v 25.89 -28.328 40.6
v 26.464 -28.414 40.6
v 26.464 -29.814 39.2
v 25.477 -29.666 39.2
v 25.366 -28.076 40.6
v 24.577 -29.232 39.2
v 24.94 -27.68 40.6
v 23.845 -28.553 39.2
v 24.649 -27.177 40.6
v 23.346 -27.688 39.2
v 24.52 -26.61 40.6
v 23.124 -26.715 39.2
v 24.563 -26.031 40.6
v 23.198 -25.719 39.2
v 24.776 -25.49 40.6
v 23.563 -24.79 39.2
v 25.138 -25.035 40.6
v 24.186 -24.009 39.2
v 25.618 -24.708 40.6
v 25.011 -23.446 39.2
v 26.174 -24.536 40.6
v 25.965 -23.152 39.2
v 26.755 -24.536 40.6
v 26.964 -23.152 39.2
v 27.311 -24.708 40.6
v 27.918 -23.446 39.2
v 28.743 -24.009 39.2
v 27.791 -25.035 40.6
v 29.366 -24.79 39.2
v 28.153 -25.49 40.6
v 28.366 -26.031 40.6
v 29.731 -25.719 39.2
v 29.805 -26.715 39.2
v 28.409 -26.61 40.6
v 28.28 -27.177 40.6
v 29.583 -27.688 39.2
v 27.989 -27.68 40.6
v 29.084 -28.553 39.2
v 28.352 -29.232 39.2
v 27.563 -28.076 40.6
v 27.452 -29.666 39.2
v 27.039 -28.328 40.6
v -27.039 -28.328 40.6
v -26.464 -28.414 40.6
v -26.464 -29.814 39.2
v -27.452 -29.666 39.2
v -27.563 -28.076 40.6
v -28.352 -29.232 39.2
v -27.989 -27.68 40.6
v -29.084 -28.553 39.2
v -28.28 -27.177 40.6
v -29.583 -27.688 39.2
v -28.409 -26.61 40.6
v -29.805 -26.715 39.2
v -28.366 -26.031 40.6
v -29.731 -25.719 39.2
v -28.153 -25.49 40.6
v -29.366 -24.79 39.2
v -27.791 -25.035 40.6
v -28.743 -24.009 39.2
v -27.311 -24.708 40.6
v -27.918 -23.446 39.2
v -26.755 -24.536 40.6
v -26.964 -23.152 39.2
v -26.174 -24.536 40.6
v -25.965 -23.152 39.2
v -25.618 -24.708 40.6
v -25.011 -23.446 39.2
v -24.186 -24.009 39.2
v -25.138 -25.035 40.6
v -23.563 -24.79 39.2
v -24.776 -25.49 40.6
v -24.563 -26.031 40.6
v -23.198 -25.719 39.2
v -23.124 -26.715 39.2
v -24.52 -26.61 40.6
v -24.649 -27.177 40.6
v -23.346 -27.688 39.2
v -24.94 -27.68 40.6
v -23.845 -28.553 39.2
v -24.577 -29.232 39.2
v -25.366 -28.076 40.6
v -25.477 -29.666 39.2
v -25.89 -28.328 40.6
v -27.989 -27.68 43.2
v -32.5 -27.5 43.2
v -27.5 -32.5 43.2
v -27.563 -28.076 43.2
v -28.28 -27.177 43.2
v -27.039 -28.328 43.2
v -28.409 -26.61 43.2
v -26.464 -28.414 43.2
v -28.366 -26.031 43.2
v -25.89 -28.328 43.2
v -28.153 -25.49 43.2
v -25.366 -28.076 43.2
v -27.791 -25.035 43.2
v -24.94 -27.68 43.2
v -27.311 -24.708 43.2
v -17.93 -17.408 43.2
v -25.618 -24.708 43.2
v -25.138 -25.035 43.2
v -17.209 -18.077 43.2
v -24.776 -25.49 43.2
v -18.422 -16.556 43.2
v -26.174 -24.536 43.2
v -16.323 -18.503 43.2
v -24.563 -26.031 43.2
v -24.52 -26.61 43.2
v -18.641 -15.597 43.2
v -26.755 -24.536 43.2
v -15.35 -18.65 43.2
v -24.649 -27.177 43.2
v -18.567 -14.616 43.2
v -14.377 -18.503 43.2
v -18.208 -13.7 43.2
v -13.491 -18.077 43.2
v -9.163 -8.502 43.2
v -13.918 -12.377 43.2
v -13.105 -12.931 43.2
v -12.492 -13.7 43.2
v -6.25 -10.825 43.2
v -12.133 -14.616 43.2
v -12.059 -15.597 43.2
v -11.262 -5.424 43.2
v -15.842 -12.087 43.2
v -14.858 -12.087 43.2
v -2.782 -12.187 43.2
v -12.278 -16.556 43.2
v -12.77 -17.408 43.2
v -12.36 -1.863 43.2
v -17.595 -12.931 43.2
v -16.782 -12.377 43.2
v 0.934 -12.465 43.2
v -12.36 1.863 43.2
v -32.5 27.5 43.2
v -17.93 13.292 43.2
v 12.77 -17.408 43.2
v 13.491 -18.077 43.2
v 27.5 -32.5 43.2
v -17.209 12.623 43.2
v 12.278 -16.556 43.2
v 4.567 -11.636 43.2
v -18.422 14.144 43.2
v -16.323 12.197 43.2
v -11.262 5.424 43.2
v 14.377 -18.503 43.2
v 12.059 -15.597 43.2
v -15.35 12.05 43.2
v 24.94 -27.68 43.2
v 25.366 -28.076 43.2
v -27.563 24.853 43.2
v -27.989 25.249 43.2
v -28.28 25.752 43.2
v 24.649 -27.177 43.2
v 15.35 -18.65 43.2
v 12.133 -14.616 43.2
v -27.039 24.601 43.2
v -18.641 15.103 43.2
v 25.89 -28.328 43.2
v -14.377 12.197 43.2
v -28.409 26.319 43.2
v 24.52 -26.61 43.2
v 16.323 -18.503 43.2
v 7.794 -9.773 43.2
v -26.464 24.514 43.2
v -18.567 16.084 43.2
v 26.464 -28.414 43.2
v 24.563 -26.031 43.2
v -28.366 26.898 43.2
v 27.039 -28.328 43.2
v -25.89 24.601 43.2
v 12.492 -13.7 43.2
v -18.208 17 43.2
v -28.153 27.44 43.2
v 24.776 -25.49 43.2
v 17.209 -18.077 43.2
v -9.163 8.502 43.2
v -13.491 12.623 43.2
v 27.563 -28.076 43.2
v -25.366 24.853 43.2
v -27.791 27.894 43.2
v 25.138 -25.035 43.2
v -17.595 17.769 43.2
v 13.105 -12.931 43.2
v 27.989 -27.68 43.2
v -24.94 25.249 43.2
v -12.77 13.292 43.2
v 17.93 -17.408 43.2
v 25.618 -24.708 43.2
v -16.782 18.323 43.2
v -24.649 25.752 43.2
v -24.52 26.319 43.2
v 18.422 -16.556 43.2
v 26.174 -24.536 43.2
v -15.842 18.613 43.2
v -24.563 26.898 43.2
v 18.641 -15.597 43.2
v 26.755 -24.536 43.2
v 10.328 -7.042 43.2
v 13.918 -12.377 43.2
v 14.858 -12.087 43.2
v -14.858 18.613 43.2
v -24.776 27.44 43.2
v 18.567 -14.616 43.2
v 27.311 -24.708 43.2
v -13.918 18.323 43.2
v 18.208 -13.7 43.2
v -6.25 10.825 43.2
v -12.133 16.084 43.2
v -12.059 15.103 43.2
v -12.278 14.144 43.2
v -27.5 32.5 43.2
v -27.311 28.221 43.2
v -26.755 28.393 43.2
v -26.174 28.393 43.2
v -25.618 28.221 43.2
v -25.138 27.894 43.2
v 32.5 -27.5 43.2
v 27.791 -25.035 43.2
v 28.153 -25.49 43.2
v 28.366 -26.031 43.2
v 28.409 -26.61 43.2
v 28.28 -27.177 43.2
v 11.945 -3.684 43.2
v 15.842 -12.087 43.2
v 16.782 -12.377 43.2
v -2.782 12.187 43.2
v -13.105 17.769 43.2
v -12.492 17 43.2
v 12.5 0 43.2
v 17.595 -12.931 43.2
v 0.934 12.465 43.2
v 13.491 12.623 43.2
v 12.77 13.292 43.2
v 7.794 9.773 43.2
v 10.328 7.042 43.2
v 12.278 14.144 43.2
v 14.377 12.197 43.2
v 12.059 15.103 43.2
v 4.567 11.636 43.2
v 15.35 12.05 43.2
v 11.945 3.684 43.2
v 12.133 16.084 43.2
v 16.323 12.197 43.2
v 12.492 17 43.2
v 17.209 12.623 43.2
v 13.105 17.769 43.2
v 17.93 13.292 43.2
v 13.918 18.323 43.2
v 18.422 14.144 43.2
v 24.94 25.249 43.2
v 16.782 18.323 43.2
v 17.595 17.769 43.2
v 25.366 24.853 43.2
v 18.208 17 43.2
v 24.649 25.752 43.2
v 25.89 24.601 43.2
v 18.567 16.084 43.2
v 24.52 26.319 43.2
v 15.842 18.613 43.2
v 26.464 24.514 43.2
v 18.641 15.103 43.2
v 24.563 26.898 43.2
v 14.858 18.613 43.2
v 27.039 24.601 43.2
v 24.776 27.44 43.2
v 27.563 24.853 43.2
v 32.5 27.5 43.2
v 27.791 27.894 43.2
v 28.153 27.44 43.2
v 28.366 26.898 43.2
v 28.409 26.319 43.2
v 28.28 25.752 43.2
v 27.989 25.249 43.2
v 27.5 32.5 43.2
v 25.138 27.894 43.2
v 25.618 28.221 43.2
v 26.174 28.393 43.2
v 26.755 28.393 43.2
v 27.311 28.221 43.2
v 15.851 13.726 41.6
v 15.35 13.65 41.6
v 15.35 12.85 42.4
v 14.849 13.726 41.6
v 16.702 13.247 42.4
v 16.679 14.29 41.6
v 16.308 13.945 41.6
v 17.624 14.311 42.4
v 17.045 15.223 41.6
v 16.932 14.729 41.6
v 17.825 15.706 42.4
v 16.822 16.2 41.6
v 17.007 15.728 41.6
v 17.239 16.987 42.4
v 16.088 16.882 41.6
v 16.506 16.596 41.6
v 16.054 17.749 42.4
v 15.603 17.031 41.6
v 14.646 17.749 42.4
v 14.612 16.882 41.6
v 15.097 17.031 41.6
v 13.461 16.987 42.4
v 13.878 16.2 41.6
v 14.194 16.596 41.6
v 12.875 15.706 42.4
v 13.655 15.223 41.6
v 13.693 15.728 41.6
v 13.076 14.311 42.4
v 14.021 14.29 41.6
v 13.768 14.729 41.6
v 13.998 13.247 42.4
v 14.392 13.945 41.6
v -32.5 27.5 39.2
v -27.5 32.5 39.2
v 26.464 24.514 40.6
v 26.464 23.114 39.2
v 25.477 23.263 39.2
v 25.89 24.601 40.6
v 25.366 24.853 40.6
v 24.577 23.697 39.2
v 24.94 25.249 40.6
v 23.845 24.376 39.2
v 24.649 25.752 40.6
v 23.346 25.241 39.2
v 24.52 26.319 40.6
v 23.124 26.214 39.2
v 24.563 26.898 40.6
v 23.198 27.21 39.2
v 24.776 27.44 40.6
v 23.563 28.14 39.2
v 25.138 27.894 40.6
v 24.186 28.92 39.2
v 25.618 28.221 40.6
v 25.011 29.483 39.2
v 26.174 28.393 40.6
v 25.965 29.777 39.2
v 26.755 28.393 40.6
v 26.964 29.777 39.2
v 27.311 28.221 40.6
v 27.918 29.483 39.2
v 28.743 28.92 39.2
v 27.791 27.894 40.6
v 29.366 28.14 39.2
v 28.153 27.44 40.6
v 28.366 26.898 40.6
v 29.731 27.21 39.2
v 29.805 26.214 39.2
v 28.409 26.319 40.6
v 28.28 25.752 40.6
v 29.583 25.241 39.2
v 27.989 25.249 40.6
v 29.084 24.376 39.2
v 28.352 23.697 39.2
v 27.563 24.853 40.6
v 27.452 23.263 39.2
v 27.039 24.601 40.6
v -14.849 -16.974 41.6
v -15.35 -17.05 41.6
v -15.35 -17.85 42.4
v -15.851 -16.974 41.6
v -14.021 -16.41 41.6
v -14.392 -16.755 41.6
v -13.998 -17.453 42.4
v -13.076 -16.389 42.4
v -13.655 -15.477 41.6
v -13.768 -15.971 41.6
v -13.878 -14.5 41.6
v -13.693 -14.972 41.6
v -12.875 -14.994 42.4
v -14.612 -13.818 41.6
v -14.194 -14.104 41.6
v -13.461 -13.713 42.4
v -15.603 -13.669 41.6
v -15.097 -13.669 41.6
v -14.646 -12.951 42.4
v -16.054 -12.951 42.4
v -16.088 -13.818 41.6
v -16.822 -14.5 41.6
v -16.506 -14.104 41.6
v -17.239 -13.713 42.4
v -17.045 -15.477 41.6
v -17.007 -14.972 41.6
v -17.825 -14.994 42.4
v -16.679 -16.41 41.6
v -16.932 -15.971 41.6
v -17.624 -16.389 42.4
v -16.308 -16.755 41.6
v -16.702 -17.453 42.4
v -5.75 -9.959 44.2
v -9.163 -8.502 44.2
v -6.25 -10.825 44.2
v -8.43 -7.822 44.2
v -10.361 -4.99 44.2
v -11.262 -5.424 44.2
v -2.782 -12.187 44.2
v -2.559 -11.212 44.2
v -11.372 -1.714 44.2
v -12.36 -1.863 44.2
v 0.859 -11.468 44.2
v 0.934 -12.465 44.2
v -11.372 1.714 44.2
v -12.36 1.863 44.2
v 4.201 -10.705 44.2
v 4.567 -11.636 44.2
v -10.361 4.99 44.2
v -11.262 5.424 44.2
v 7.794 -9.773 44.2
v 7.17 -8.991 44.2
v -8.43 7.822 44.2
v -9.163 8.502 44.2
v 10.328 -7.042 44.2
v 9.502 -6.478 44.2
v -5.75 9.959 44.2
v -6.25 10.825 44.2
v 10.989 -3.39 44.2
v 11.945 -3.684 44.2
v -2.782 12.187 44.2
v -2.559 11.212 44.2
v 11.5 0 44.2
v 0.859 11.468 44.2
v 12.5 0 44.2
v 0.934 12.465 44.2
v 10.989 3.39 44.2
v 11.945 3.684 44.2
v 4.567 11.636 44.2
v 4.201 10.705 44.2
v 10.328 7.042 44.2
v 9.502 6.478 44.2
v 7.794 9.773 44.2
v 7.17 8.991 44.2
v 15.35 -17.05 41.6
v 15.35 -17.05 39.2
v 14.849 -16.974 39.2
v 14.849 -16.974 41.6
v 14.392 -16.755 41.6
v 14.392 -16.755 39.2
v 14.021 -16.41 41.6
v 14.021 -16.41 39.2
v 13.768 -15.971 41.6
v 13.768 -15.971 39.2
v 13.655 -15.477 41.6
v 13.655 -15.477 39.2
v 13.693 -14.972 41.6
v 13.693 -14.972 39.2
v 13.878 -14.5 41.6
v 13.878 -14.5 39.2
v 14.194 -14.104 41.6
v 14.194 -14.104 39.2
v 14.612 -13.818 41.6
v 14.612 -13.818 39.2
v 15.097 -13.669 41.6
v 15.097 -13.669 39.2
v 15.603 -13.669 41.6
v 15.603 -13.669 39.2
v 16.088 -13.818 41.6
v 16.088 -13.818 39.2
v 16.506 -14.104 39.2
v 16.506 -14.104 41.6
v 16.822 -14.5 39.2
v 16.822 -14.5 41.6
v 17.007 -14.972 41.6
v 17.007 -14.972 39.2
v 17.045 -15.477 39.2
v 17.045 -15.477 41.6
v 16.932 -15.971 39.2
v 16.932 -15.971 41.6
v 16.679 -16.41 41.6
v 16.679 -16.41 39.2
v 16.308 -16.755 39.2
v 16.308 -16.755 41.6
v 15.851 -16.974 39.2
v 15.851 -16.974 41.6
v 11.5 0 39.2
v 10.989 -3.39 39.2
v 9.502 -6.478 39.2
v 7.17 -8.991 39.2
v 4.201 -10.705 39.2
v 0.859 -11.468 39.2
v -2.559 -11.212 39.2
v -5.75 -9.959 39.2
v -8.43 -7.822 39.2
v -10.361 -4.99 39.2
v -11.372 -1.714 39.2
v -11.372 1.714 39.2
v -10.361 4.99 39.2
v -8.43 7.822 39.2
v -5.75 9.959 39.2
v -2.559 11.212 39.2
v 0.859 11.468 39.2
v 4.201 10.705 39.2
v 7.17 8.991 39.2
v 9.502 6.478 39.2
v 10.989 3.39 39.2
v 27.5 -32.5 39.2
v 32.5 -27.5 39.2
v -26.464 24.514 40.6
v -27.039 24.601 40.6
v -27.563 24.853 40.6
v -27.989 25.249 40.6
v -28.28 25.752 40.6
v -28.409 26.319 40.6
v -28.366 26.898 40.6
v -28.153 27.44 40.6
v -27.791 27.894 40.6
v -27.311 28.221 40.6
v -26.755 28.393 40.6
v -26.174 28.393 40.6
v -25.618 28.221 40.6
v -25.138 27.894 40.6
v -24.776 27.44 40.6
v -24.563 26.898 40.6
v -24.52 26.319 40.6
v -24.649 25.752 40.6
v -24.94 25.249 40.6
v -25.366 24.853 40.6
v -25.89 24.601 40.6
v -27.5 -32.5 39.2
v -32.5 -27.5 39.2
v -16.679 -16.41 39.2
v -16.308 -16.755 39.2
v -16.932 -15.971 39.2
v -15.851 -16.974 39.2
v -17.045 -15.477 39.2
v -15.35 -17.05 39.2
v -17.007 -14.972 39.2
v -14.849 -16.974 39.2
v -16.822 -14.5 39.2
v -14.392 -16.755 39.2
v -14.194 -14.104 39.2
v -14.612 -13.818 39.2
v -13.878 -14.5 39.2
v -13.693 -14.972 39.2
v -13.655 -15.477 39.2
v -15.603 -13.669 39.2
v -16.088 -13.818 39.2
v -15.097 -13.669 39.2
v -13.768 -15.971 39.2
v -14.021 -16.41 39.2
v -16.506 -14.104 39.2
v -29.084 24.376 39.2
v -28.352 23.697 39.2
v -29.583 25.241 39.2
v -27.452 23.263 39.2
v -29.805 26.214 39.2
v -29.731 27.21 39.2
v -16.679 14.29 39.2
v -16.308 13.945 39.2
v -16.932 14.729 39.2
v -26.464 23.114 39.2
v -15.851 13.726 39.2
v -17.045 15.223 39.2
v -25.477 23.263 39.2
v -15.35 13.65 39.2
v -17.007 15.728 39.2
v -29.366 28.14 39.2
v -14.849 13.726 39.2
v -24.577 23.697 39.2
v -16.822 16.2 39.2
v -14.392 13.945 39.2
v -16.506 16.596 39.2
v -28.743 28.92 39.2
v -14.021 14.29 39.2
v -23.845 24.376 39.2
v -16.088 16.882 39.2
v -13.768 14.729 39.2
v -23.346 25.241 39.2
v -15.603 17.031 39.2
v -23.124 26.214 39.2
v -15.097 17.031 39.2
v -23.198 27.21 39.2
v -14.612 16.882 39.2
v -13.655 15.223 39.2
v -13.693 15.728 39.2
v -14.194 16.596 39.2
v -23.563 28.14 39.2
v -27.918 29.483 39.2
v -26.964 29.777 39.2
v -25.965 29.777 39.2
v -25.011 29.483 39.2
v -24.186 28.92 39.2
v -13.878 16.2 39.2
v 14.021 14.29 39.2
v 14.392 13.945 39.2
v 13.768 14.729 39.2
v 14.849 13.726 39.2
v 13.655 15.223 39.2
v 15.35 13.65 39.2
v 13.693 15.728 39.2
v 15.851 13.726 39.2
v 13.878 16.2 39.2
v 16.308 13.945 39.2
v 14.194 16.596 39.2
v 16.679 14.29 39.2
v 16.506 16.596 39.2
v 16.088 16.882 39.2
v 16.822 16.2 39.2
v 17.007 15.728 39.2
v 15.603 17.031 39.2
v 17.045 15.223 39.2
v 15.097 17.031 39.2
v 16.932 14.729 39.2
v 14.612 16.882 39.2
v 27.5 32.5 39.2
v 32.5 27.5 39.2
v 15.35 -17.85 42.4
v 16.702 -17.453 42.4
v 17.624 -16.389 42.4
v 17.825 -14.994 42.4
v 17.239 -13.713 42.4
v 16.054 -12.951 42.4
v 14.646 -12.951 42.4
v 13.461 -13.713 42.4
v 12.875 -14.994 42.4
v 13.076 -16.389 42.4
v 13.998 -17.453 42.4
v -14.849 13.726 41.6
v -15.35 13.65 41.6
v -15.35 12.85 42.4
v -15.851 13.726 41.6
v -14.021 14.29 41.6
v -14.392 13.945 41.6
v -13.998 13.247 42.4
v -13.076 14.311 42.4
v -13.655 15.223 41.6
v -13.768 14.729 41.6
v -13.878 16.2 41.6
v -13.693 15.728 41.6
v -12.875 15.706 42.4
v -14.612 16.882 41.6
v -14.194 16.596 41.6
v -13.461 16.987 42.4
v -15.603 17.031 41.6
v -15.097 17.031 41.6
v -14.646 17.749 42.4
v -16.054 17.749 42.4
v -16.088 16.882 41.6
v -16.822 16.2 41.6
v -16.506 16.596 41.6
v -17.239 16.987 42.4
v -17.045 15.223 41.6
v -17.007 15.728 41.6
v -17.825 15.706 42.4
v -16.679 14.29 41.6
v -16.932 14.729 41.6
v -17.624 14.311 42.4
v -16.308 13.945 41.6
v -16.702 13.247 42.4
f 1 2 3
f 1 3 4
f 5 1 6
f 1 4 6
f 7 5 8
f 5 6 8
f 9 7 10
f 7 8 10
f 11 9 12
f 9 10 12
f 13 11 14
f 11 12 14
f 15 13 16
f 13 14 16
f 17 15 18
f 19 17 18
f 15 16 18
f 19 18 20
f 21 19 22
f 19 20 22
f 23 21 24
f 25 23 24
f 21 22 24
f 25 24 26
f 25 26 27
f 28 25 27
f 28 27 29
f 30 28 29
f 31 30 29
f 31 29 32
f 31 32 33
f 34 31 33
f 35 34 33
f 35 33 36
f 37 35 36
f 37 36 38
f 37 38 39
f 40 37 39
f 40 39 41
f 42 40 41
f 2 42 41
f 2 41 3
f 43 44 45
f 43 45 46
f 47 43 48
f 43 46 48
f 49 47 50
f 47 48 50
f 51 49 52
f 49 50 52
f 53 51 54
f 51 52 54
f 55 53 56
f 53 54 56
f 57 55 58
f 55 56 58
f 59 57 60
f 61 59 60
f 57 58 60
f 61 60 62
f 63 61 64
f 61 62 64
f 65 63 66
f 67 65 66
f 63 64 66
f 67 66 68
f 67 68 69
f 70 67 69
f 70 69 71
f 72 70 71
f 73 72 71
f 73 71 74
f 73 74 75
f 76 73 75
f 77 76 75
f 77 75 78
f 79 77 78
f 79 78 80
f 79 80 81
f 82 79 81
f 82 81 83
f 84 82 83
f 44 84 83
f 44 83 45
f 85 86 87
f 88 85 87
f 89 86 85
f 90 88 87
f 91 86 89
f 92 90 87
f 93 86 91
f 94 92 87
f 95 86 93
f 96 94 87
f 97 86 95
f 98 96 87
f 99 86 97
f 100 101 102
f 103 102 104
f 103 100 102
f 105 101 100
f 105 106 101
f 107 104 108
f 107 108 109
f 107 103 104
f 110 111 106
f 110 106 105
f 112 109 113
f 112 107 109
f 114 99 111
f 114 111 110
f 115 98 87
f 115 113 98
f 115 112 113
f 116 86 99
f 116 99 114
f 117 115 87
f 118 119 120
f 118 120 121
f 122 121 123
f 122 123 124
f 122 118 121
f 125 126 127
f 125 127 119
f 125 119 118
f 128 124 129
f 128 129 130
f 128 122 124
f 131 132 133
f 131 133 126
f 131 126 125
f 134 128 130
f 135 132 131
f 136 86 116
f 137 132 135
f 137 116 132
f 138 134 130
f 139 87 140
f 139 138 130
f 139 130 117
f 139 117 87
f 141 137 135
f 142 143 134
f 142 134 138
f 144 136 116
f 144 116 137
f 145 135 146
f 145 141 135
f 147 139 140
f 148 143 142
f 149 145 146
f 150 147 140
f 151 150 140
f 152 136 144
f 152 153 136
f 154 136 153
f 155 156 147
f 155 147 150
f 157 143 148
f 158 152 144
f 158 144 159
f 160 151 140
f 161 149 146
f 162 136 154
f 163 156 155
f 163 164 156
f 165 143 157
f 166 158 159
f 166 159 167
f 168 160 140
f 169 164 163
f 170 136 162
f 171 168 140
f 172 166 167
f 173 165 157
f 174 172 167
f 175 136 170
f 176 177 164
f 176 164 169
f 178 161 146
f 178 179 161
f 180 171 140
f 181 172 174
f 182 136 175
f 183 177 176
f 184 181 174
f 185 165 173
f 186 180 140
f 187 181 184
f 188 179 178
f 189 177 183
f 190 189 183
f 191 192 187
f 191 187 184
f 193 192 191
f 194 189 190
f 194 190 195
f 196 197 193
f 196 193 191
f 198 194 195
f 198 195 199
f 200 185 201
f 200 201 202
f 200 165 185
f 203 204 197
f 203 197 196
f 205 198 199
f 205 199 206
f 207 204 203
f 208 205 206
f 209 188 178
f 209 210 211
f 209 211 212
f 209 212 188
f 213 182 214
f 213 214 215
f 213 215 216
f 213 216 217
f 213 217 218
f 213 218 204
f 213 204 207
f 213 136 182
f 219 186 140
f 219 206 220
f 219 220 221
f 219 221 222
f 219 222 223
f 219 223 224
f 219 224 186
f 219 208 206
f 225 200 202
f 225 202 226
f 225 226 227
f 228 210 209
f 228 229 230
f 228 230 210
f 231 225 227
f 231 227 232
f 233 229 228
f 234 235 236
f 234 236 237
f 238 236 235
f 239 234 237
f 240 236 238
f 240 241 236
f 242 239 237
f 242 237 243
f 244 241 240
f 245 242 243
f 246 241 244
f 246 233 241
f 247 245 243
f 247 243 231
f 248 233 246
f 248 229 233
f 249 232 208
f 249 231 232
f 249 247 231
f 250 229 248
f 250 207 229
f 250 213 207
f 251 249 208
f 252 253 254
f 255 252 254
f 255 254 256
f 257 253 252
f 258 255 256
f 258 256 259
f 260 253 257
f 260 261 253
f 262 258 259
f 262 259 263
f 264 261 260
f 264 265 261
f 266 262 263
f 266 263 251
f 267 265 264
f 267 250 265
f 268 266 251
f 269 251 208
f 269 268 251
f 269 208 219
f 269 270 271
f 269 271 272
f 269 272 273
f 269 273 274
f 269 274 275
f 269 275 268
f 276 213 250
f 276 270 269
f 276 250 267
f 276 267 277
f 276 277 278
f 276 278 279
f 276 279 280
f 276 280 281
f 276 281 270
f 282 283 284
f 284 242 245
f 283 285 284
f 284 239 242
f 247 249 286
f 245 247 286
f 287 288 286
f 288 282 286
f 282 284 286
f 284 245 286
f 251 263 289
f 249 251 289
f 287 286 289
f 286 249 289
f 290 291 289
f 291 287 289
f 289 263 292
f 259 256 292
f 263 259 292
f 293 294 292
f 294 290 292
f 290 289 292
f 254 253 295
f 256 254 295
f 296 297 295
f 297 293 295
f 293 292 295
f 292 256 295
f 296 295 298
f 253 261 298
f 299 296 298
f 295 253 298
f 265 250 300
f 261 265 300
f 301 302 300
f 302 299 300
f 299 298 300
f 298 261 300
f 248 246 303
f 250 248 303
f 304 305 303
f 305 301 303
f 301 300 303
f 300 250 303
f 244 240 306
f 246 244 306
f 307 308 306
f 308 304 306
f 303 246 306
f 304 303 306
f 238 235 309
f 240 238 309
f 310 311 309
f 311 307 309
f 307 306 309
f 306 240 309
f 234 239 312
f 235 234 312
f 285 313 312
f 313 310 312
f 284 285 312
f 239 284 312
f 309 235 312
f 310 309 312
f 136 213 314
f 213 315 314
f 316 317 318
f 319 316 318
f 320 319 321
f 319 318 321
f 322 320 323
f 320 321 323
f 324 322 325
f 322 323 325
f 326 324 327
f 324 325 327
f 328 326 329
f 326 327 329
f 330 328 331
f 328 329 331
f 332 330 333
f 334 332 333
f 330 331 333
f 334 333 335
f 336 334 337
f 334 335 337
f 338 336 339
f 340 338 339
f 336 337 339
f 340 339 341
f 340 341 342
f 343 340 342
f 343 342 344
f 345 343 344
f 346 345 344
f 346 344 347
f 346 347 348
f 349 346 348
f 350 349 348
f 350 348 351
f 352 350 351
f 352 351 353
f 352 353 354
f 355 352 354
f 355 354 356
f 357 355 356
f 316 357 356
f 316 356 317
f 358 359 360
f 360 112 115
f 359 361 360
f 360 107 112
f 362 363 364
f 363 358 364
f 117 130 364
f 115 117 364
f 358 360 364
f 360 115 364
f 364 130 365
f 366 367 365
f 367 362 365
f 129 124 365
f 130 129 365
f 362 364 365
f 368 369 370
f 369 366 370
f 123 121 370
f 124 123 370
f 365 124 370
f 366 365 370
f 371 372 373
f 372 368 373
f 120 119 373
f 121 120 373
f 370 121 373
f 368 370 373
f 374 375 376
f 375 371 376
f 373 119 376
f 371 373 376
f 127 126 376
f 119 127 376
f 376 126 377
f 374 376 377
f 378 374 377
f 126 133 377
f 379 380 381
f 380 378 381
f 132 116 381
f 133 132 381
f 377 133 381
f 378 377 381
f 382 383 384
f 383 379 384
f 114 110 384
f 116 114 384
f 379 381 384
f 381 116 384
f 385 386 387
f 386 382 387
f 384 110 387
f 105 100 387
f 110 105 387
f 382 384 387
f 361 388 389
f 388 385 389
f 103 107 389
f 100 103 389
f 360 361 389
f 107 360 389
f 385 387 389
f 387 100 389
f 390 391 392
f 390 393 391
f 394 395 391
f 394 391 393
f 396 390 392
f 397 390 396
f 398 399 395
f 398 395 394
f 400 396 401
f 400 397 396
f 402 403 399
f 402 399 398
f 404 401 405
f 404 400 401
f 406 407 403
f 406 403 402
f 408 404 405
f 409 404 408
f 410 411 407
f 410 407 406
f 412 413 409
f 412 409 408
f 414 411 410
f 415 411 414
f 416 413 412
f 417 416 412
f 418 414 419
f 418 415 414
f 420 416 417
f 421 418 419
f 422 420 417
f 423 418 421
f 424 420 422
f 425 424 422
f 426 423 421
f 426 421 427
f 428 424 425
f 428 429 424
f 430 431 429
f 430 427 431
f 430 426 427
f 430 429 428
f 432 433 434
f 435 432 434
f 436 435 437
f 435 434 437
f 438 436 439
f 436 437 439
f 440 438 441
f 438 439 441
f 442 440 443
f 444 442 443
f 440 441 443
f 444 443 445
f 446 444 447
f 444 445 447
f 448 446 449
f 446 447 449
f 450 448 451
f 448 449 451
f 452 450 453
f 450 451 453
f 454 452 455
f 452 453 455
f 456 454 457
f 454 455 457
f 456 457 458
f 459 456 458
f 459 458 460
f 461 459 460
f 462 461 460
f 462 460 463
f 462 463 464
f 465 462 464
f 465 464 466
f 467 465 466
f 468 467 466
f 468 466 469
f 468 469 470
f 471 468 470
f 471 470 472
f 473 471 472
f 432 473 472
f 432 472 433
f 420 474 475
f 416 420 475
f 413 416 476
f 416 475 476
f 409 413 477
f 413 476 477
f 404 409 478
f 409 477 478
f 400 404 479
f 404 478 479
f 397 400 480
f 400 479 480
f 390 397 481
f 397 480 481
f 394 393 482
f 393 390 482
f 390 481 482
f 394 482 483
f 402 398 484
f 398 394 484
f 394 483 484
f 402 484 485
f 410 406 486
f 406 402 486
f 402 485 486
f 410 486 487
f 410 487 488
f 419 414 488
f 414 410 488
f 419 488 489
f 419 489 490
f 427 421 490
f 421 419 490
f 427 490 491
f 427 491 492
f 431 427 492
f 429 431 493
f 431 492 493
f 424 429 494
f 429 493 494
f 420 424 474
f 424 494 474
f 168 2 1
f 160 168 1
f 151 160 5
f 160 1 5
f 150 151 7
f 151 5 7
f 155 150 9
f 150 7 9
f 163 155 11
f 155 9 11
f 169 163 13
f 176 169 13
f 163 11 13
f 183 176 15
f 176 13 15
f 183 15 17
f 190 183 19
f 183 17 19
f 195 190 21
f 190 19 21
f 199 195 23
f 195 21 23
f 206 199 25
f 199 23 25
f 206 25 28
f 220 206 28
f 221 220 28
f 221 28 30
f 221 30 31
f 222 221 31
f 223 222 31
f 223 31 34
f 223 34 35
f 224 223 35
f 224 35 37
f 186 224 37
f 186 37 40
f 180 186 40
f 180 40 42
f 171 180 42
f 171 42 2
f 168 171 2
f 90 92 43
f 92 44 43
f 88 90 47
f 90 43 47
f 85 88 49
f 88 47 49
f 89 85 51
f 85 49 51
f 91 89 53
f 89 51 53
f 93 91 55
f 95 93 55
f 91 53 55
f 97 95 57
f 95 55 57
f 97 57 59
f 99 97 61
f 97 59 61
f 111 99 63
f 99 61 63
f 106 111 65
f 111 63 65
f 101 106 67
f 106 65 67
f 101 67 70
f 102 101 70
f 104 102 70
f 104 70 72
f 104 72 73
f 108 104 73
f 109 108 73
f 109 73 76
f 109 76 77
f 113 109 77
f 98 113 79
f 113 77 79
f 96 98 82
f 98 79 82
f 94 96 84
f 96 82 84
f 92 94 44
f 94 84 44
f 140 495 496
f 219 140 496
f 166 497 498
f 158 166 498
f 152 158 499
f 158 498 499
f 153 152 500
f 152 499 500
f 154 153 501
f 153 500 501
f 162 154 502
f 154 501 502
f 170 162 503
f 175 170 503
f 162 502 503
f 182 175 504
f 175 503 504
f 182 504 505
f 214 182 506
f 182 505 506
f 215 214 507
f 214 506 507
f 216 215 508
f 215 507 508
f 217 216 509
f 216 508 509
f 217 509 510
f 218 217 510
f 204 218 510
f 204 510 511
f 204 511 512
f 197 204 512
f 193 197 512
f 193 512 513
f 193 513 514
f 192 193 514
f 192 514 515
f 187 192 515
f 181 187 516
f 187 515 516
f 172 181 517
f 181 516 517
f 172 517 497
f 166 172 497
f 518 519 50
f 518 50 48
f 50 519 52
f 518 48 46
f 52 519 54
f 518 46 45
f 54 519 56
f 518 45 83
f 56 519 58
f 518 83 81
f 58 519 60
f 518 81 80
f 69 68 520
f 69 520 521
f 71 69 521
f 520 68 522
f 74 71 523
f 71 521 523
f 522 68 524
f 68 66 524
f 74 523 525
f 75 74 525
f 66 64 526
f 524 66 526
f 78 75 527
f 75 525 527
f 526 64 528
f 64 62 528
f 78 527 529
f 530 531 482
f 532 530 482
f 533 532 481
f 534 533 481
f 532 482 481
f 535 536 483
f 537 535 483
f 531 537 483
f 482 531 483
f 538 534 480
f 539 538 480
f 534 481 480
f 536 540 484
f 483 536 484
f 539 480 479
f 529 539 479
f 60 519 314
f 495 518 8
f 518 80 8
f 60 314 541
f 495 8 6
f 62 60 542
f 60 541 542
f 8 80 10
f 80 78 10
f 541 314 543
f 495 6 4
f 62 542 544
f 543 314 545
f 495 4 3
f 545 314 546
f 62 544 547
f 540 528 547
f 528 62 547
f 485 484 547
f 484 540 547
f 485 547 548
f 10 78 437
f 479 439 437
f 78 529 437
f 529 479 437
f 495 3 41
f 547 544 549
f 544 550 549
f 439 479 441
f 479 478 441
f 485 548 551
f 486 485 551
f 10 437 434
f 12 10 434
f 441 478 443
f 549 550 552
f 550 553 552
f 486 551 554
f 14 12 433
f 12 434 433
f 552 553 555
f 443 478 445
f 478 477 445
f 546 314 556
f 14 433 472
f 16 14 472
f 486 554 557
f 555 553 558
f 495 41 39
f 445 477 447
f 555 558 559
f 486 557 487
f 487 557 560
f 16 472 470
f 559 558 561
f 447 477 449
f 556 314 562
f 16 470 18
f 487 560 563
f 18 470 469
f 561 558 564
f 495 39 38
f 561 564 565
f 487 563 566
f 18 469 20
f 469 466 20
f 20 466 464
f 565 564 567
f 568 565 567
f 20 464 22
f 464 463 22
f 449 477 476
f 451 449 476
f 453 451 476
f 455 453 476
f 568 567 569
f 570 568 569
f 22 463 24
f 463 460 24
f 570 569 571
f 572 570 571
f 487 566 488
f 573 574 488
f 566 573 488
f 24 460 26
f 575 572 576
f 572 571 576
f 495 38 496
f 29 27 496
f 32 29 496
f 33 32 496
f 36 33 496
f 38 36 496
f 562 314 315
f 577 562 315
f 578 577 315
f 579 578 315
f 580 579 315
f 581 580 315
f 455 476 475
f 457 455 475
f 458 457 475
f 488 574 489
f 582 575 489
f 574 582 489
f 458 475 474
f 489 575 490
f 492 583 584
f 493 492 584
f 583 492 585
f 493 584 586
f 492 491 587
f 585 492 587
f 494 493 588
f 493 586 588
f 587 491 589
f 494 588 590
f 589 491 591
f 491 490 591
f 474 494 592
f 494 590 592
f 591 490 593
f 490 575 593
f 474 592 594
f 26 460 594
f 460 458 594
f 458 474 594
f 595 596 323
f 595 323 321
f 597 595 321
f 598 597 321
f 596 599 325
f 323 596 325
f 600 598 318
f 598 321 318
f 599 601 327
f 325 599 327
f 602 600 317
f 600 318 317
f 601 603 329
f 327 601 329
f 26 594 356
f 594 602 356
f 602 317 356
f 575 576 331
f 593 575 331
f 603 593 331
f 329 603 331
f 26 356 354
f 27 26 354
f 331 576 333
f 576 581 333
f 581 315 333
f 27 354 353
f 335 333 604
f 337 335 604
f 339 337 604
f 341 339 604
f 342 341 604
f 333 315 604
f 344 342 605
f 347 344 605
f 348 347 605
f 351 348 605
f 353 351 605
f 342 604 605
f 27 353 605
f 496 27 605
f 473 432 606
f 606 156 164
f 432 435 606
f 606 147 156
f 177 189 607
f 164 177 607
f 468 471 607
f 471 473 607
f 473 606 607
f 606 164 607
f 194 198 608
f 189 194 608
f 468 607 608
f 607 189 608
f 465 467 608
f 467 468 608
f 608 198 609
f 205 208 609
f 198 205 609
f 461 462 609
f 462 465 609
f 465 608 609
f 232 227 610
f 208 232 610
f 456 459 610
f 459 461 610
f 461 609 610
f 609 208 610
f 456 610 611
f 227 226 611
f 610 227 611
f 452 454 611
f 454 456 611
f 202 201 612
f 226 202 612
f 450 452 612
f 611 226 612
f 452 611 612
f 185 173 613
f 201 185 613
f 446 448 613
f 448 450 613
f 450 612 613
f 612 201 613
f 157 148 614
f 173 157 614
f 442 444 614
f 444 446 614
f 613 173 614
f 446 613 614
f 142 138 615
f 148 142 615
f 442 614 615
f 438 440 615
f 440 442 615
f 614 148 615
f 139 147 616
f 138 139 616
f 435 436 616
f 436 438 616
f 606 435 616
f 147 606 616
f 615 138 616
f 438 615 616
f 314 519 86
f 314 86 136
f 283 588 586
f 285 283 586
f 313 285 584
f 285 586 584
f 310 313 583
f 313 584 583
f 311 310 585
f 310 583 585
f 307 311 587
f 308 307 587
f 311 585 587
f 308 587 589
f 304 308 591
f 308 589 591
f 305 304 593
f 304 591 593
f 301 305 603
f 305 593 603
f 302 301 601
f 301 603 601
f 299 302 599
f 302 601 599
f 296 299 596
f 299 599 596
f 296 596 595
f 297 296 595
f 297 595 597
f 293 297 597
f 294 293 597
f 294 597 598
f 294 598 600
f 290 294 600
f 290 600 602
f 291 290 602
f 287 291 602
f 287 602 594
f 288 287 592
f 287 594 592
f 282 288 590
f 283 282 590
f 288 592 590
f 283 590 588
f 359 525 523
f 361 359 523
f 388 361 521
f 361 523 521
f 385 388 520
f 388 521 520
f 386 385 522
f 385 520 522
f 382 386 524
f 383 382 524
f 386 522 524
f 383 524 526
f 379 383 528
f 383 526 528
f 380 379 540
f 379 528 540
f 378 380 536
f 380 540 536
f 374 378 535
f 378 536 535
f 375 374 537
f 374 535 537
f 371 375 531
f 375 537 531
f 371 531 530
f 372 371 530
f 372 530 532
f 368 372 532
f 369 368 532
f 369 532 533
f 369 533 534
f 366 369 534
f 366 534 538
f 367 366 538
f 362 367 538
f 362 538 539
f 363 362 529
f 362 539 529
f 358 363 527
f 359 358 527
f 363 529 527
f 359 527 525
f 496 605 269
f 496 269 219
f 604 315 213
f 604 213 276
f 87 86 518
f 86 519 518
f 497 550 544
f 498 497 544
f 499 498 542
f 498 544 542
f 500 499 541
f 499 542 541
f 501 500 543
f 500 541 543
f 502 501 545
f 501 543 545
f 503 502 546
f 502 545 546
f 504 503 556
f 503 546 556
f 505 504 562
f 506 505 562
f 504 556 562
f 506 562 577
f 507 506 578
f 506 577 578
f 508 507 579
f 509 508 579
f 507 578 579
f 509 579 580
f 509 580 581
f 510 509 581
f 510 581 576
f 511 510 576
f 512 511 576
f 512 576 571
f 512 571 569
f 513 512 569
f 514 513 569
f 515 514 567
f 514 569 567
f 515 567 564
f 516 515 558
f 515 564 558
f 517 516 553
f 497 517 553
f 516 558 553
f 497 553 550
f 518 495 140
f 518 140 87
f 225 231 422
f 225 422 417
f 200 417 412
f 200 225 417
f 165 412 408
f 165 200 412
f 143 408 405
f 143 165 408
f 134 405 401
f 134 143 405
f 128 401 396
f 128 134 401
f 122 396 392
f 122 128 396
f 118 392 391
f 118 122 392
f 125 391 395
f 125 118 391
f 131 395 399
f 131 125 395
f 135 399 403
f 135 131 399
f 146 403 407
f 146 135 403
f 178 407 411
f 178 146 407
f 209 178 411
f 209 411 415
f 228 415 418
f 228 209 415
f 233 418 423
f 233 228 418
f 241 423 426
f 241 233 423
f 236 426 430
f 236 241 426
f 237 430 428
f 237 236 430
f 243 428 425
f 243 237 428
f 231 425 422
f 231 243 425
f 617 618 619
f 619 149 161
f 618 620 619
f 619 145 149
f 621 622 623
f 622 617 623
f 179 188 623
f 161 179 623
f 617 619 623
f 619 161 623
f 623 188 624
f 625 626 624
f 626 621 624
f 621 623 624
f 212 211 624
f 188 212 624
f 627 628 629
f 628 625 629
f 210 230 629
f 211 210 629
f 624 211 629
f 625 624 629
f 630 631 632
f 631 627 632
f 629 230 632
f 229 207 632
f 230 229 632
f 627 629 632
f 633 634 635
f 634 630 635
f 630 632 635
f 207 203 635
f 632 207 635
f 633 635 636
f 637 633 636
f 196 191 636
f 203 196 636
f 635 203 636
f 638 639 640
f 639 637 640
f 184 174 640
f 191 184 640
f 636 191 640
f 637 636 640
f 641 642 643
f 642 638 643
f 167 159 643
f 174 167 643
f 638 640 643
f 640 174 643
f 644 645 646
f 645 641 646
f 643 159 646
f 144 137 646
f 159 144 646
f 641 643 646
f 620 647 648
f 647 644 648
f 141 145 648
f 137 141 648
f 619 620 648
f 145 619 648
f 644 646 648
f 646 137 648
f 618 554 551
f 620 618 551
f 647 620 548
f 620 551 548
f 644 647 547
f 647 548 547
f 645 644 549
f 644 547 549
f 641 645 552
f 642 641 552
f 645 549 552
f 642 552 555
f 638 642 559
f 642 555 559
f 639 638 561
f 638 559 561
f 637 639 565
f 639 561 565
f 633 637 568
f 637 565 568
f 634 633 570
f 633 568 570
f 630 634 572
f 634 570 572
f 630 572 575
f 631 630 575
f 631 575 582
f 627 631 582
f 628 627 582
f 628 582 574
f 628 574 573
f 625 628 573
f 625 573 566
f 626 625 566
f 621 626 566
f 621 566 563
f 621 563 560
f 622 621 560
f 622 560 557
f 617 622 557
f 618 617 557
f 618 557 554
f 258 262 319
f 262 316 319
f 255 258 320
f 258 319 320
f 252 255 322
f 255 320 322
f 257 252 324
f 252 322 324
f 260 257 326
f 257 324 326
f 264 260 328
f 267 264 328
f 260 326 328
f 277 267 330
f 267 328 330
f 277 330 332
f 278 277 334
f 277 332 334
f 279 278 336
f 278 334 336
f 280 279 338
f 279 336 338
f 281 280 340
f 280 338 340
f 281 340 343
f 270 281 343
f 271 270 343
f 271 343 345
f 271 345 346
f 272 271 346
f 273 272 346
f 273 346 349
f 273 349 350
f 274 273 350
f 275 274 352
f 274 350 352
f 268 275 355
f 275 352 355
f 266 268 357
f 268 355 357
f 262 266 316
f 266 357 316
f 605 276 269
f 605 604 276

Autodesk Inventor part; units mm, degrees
ref_plane "YZ Plane" through (0, 0, 0) normal (1, 0, 0) x (0, 1, 0)
ref_plane "XZ Plane" through (0, 0, 0) normal (0, 1, 0) x (-1, 0, 0)
ref_plane "РабПлоскость1" through (0, 0, 39.2) normal (0, 0, 1) x (1, 0, 0)
sketch "Эскиз1" plane through (0, 0, 39.2) normal (0, 0, 1) x (1, 0, 0)
  line L0 (27.5, -32.5) -> (-27.5, -32.5)
  line L1 (-32.5, -27.5) -> (-32.5, 27.5)
  line L2 (-27.5, 32.5) -> (27.5, 32.5)
  line L3 (32.5, 27.5) -> (32.5, -27.5)
  line L4 (32.5, -32.5) -> (-32.5, 32.5) construction
  line L5 (-32.5, -32.5) -> (32.5, 32.5) construction
  circle A0 centre (-15.35, 15.35) radius 1.75 construction
  circle A1 centre (15.35, 15.35) radius 1.75 construction
  arc A2 (14.0855, -15.35) -> (14.4559, -14.4559) centre (15.35, -15.35) ccw construction
  arc A3 (-16.6145, -15.35) -> (-16.2441, -14.4559) centre (-15.35, -15.35) ccw construction
  line L6 (-27.5, 32.5) -> (-32.5, 27.5)
  line L7 (-32.5, -27.5) -> (-27.5, -32.5)
  line L8 (27.5, -32.5) -> (32.5, -27.5)
  line L9 (27.5, 32.5) -> (32.5, 27.5)
  circle A4 centre (0, 0) radius 10.7 construction
  circle A5 centre (0, 0) radius 8.46 construction
  circle A6 centre (0, 0) radius 11.5
  dimension "d0" = 65
  dimension "d1" = 5
  dimension "d2" = 5
  dimension "d3" = 5
  dimension "d4" = 5
  dimension "d5" = 5
  dimension "d6" = 5
  dimension "d7" = 5
  dimension "d8" = 5
  dimension "d9" = 23
extrude "Выдавливание1" add sketch "Эскиз1" along normal blind 4
sketch "Эскиз2" plane through (0, 0, 43.2) normal (0, 0, 1) x (1, 0, 0)
  line L0 (15.35, -15.35) -> (-15.35, -15.35) construction
  line L1 (-15.35, -15.35) -> (-15.35, 15.35) construction
  line L2 (-15.35, 15.35) -> (15.35, 15.35) construction
  line L3 (15.35, 15.35) -> (15.35, -15.35) construction
  line L4 (15.35, -15.35) -> (-15.35, 15.35) construction
  line L5 (-15.35, -15.35) -> (15.35, 15.35) construction
  point P0 (0, 0)
  dimension "d12" = 30.7
hole "Отверстие1" at (-15.35, 15.35, 43.2) at (15.35, 15.35, 43.2) at (15.35, -15.35, 43.2) at (-15.35, -15.35, 43.2) direction (0, 0, -1) diameter 3.4 end through all countersink diameter 6.6 countersink angle 90 clearance for "с потайной головкой ГОСТ 12876-67" size "M3" standard "ГОСТ"
sketch "Эскиз3" plane through (0, 0, 43.2) normal (0, 0, 1) x (1, 0, 0)
  line L0 (26.4645, -26.4645) -> (-26.4645, -26.4645) construction
  line L1 (-26.4645, -26.4645) -> (-26.4645, 26.4645) construction
  line L2 (-26.4645, 26.4645) -> (26.4645, 26.4645) construction
  line L3 (26.4645, 26.4645) -> (26.4645, -26.4645) construction
  line L4 (26.4645, -26.4645) -> (-26.4645, 26.4645) construction
  line L5 (-26.4645, -26.4645) -> (26.4645, 26.4645) construction
  line L6 (-27.5, 32.5) -> (-32.5, 27.5) construction
  point P0 (0, 0)
  point P1 (-30, 30)
  dimension "d31" = 5
hole "Отверстие2" at (-26.4645, 26.4645, 43.2) at (26.4645, 26.4645, 43.2) at (26.4645, -26.4645, 43.2) at (-26.4645, -26.4645, 43.2) direction (0, 0, -1) diameter 3.9 end through all
sketch "Эскиз4" plane through (0, 0, 43.2) normal (0, 0, 1) x (1, 0, 0)
  circle A0 centre (0, 0) radius 12.5
  circle A1 centre (0, 0) radius 11.5 projected
  dimension "d28" = 1
extrude "Выдавливание2" add sketch "Эскиз4" along normal blind 1
chamfer "Фаска1" distance 1.4 angle 45 4 edges at (-26.4645, -24.5145, 39.2) (26.4645, -24.5145, 39.2) (-26.4645, 28.4145, 39.2) (26.4645, 28.4145, 39.2)
equation "\"d2\" = d1"
equation "\"d3\" = d1"
equation "\"d4\" = d3"
equation "\"d5\" = d1"
equation "\"d6\" = d5"
equation "\"d7\" = d1"
equation "\"d8\" = d7"
properties part number "Основание_нижнее" material "По умолчанию1"
